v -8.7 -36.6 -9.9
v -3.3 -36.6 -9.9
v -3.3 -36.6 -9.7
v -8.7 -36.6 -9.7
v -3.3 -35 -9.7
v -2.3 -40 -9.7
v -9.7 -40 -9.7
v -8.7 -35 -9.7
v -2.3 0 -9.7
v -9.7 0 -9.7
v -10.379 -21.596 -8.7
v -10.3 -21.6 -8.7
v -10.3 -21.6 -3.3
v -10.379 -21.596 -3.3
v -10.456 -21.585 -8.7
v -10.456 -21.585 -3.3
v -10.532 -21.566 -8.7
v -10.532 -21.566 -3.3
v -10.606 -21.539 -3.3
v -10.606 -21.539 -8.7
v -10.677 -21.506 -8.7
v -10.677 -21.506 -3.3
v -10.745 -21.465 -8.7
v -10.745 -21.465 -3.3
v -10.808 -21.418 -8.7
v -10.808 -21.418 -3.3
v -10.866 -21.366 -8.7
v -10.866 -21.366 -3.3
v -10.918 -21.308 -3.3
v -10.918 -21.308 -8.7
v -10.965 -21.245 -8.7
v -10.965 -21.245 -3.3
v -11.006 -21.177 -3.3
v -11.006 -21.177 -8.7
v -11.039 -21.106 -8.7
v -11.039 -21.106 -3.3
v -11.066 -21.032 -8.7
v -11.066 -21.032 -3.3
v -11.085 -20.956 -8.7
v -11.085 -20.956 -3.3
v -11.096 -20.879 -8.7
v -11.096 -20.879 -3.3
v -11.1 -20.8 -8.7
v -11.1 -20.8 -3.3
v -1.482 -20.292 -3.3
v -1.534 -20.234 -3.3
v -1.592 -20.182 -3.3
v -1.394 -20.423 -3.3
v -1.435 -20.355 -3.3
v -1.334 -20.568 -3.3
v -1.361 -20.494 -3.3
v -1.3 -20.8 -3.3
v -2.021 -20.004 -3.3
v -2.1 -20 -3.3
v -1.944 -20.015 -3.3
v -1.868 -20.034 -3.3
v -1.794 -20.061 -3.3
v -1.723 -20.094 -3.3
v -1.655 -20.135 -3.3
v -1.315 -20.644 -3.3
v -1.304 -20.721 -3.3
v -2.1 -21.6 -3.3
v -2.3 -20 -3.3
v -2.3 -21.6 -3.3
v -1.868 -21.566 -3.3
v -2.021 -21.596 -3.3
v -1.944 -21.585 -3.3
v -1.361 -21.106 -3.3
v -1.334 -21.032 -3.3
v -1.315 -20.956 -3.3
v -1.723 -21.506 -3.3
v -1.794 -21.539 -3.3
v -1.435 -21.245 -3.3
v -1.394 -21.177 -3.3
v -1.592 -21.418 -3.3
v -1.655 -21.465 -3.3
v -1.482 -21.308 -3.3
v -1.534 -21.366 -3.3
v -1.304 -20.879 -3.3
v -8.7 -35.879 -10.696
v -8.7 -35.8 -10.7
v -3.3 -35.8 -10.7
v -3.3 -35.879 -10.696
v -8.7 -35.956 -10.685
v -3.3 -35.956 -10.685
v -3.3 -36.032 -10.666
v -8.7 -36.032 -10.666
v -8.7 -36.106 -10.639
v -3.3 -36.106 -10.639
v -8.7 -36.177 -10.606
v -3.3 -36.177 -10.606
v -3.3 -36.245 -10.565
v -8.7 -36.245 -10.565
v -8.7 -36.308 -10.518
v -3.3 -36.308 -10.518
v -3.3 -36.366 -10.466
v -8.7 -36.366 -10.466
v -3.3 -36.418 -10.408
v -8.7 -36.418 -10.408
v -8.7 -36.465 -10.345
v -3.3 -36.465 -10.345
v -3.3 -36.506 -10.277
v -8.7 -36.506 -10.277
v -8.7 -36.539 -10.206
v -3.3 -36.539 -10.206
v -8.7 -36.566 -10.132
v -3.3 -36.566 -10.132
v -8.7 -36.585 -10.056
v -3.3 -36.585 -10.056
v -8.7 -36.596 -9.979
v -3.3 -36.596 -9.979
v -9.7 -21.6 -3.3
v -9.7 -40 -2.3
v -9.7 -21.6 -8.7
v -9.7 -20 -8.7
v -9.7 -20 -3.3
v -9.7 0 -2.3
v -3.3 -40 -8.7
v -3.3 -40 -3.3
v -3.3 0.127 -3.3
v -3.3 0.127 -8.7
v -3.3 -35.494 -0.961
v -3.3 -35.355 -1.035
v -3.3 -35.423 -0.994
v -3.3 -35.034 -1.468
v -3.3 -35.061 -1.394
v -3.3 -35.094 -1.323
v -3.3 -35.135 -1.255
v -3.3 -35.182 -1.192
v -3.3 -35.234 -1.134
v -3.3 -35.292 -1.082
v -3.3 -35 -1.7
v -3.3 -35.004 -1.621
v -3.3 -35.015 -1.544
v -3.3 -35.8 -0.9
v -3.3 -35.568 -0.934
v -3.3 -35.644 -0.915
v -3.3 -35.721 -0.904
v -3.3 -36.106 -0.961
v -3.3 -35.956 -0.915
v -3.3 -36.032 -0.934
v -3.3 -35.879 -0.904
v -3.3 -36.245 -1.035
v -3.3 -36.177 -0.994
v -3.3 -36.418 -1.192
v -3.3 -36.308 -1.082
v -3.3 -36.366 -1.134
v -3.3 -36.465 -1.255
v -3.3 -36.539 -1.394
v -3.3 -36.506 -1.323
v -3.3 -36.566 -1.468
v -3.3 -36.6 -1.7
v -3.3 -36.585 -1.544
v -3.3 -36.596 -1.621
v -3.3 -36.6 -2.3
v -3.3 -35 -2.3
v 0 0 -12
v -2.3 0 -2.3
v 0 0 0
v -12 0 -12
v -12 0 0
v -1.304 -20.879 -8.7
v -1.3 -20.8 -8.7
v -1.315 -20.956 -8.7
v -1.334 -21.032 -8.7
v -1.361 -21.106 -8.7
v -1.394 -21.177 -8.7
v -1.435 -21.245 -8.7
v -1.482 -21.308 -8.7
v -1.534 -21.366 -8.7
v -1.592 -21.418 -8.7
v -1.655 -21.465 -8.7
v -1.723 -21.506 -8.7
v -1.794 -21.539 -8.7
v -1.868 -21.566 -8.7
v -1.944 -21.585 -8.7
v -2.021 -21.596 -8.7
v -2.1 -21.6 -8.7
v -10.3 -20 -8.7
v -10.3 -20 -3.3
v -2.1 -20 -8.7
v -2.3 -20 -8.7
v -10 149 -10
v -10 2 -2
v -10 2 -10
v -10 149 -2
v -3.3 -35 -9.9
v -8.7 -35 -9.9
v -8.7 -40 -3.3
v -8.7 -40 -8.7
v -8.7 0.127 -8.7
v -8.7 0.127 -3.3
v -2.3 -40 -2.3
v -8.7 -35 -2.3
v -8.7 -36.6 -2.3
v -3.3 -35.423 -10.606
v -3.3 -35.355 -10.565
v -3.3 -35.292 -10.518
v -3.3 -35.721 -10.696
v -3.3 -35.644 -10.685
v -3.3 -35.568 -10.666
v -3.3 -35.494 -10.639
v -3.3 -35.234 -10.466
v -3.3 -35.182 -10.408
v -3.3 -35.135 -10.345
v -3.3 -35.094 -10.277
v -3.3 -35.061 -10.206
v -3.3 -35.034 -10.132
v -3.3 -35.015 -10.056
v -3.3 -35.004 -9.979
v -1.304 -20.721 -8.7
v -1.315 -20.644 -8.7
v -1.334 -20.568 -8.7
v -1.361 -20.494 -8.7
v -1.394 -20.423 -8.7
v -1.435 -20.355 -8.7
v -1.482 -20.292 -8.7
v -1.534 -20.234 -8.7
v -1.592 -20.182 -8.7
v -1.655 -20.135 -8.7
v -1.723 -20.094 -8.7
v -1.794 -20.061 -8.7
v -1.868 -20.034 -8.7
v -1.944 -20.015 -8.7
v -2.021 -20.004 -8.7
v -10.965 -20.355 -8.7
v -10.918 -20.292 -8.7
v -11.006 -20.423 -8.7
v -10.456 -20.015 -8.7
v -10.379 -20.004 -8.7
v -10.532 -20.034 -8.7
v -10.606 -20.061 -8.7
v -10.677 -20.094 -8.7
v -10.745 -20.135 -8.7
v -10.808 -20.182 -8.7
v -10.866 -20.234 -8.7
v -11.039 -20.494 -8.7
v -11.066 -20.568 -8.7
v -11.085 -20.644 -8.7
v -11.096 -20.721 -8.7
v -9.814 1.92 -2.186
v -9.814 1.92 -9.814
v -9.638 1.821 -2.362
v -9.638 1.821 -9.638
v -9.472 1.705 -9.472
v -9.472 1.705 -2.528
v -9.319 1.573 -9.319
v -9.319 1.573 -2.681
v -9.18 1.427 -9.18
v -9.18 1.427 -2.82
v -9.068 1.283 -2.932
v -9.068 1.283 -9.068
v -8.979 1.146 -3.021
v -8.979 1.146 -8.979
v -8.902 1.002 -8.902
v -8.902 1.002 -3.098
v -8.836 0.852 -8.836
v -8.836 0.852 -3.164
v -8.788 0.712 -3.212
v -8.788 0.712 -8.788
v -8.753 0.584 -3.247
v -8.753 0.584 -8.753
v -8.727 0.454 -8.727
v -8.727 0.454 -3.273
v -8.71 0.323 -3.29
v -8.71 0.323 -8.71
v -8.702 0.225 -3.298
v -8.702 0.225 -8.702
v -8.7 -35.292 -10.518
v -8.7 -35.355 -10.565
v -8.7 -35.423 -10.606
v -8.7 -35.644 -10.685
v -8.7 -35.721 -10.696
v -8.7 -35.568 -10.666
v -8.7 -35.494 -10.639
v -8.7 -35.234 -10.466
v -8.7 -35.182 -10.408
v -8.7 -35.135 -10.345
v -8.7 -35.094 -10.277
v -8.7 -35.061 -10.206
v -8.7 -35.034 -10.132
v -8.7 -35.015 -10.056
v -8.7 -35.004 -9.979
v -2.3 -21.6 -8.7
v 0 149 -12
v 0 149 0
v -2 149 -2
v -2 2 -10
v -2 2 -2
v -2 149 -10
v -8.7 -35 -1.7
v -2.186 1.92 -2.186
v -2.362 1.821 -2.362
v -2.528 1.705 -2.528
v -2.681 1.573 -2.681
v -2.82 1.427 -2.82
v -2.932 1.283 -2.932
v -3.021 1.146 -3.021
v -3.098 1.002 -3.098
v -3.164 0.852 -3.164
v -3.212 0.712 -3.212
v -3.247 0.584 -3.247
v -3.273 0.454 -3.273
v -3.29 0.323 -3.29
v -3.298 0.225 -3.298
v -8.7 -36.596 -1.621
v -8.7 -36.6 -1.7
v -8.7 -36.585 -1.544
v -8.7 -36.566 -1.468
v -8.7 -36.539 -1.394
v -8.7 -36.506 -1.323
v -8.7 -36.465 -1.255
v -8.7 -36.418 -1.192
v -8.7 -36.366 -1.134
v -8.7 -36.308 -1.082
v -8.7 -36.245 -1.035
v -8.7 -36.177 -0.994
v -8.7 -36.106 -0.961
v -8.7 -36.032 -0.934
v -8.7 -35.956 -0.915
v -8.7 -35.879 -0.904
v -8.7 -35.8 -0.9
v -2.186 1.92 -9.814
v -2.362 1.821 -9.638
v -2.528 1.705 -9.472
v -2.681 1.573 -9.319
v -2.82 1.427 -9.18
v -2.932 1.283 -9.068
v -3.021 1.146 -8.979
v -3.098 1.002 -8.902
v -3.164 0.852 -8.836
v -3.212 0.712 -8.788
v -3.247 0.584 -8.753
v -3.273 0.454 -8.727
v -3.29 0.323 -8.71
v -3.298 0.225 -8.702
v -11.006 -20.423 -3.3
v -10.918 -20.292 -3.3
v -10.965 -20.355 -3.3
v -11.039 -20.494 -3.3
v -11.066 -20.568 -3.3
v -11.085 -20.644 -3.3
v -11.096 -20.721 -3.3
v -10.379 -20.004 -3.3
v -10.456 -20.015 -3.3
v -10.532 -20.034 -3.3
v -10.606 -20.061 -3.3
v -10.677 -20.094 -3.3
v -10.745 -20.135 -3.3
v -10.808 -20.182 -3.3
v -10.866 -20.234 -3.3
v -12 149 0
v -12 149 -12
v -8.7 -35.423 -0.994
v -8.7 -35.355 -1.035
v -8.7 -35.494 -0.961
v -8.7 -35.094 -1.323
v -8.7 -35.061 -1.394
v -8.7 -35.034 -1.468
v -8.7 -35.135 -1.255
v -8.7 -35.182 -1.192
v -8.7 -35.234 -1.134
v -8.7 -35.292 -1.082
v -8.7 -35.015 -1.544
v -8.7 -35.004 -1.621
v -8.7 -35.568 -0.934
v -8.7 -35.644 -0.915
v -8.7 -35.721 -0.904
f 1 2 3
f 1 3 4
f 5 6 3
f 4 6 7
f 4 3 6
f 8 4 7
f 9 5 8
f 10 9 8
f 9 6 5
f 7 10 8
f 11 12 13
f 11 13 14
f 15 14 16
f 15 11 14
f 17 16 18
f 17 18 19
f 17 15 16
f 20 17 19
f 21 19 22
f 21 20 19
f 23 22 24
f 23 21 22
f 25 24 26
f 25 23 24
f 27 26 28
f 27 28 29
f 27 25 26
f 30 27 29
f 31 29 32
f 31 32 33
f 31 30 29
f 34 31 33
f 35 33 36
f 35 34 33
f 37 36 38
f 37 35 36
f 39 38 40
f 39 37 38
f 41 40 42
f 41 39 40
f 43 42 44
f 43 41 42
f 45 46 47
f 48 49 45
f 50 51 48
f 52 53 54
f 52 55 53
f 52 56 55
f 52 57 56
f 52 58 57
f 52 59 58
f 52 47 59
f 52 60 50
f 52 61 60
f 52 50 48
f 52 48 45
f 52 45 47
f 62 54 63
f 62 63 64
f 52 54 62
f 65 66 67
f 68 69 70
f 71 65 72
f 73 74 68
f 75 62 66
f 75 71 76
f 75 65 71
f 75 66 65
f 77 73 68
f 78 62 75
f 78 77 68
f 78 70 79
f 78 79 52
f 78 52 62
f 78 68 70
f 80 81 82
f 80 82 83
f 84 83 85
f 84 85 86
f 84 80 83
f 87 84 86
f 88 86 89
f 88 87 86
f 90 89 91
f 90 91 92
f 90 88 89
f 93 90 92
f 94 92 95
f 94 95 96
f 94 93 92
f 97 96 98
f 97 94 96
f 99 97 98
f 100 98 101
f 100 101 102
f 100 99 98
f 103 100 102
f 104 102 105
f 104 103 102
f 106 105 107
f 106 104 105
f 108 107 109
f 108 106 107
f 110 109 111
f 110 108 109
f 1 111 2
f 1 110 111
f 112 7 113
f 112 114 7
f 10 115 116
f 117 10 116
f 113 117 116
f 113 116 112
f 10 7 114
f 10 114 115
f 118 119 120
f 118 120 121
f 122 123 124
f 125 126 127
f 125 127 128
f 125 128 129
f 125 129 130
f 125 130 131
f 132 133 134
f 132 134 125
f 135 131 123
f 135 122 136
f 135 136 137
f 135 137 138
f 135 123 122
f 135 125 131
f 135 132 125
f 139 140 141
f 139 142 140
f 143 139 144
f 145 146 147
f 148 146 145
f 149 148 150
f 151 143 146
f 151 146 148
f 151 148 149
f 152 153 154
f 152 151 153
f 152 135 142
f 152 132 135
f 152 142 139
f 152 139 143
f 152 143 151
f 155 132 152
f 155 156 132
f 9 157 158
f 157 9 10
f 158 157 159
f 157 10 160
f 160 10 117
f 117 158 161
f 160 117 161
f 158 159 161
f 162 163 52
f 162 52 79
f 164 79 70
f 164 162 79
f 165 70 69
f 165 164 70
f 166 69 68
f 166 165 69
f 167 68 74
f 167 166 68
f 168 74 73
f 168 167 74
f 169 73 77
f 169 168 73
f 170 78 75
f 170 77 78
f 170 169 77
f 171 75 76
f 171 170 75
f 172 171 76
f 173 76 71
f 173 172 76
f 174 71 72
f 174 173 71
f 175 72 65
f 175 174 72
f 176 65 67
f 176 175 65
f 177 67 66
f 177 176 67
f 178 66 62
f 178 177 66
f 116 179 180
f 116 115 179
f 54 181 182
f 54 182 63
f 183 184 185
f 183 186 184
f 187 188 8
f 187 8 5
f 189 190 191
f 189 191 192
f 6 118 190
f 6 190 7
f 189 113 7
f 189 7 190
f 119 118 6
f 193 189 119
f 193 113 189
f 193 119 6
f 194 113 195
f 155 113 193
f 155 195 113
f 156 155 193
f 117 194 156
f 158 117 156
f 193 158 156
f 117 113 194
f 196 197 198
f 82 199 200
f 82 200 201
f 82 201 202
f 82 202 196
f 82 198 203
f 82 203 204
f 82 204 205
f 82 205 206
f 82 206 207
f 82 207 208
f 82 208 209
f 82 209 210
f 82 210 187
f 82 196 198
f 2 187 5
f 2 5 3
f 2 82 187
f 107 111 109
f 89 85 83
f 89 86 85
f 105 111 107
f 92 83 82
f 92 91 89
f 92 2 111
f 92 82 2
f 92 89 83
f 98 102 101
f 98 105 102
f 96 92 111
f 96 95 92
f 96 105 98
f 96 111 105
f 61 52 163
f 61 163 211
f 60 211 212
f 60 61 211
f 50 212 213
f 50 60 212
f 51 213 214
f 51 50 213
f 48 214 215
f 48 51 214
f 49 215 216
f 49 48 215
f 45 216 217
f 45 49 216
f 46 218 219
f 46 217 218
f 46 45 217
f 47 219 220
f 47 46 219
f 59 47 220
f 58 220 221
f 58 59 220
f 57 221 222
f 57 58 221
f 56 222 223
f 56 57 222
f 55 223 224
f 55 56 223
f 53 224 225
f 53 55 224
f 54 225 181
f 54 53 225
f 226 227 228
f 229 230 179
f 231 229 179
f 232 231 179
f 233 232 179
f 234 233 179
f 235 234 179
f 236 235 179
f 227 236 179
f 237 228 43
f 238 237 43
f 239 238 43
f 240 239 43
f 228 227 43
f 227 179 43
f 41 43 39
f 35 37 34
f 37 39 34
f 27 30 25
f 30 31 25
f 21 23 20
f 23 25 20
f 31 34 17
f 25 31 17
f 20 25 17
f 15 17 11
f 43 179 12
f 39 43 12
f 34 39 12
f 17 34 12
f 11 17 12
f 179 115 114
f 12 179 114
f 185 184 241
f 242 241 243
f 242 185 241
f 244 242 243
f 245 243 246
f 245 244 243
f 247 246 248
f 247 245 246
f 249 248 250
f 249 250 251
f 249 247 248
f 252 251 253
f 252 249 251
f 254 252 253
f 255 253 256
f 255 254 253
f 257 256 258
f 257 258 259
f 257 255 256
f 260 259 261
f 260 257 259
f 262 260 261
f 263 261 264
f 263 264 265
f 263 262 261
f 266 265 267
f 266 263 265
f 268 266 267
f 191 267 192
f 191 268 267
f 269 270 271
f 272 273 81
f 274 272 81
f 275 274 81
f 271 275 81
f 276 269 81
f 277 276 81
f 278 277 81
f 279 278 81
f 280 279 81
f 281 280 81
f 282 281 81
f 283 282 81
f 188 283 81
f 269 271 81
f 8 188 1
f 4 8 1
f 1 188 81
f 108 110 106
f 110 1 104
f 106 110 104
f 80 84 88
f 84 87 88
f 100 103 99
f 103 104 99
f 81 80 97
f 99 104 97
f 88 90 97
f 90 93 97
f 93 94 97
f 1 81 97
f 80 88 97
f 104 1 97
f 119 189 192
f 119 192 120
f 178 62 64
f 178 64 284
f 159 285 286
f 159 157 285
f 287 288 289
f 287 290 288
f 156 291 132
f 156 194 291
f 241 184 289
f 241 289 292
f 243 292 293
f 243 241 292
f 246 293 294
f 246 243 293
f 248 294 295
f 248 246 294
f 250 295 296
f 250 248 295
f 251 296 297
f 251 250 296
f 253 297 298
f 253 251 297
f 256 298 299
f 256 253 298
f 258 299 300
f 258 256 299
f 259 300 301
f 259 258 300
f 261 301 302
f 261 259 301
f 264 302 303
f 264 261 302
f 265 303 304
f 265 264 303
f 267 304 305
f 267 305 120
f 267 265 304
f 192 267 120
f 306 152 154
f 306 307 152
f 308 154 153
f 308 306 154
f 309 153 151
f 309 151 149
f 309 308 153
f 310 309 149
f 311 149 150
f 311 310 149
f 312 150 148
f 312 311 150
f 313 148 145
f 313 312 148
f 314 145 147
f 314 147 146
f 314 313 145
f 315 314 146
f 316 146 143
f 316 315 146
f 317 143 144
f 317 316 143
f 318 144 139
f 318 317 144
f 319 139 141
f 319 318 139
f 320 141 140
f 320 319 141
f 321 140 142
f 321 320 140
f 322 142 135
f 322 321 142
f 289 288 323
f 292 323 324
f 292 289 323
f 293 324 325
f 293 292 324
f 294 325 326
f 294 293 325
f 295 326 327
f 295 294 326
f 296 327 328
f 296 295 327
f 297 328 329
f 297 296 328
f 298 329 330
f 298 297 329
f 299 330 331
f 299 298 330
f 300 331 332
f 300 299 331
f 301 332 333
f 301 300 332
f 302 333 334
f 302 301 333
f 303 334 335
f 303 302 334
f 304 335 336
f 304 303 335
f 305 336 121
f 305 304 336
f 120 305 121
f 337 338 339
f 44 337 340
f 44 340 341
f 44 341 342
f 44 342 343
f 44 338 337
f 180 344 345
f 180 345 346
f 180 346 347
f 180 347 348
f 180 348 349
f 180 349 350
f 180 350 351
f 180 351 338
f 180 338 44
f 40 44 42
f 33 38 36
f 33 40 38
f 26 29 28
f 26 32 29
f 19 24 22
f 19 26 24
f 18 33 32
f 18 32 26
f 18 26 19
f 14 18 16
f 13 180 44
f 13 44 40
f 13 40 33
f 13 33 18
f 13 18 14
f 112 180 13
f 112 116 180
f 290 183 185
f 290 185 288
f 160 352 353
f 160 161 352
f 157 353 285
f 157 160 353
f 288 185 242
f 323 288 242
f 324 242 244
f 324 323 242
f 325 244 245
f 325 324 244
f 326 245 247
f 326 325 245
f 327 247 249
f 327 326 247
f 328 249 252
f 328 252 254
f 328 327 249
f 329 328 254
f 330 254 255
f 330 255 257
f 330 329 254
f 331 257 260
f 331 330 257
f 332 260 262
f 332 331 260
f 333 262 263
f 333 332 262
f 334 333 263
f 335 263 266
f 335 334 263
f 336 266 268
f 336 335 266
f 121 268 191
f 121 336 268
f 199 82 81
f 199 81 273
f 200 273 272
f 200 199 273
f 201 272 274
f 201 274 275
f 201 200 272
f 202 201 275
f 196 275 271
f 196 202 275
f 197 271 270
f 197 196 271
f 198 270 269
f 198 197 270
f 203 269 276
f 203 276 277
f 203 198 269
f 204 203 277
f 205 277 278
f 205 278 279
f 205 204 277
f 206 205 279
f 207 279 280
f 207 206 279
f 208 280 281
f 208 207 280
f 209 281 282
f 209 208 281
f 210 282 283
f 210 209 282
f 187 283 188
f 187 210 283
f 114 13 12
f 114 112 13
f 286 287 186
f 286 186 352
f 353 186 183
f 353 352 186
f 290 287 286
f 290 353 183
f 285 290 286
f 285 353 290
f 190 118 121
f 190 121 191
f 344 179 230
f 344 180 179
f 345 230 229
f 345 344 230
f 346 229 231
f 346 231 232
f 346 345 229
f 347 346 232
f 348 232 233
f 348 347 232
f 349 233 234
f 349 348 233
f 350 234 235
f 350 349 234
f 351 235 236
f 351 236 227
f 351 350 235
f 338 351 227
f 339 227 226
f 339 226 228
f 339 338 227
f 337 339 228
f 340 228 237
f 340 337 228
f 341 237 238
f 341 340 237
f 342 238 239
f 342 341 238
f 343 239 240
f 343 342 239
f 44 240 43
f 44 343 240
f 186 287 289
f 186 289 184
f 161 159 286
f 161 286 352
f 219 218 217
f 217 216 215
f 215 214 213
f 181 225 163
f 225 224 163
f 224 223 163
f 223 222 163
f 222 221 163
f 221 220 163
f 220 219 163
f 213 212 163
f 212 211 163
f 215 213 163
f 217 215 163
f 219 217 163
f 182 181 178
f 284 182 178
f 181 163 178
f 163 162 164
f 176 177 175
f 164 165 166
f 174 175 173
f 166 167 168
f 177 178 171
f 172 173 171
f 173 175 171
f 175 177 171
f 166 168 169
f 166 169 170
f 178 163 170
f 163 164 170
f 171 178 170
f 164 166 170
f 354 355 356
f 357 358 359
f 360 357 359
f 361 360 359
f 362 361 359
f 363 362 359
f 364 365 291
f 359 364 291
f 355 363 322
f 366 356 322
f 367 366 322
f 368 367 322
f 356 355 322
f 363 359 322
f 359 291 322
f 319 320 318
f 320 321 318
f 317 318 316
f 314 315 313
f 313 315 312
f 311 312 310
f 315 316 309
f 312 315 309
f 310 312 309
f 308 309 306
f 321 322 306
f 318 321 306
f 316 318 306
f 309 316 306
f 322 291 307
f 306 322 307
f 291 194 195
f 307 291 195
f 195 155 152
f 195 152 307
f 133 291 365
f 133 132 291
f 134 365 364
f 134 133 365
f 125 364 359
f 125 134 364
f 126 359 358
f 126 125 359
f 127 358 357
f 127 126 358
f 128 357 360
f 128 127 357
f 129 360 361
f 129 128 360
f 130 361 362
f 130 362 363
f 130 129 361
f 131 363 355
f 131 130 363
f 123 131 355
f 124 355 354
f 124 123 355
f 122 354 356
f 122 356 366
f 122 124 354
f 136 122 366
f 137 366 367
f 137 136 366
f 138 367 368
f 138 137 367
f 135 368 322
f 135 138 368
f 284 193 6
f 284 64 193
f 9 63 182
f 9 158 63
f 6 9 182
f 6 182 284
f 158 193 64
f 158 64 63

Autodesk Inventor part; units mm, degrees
ref_plane "YZ Plane" through (0, 0, 0) normal (1, 0, 0) x (0, 1, 0)
ref_plane "XZ Plane" through (0, 0, 0) normal (0, 1, 0) x (-1, 0, 0)
ref_plane "XY Plane" through (0, 0, 0) normal (0, 0, 1) x (1, 0, 0)
sketch "Szkic1" plane through (0, 0, 0) normal (0, 1, 0) x (-1, 0, 0)
  line L0 (0, 0) -> (12, 0)
  line L1 (12, 0) -> (12, -12)
  line L2 (12, -12) -> (0, -12)
  line L3 (0, -12) -> (0, 0)
  dimension "d0" = 12
  dimension "d1" = 12
extrude "Wyciągnięcie proste1" add sketch "Szkic1" along normal blind 86
sketch "Szkic2" plane through (0, 86, 0) normal (0, 1, 0) x (1, 0, 0)
  line L0 (0, 12) -> (-12, 12) projected
  line L1 (-12, 12) -> (-12, 0) projected
  line L2 (-12, 0) -> (0, 0) projected
  line L3 (0, 0) -> (0, 12) projected
  line L4 (-10, 2) -> (-10, 10)
  line L5 (-10, 10) -> (-2, 10)
  line L6 (-2, 10) -> (-2, 2)
  line L7 (-2, 2) -> (-10, 2)
  dimension "d4" = 2
extrude "Wyciągnięcie proste2" cut sketch "Szkic2" against normal blind 86 contours L4 L5 L6 L7
sketch "Szkic9" plane through (0, 0, 0) normal (0, -1, 0) x (1, 0, 0)
  line L0 (-2, -10) -> (-10, -10) projected
  line L1 (-2, -2) -> (-2, -10) projected
  line L2 (-10, -2) -> (-2, -2) projected
  line L3 (-10, -10) -> (-10, -2) projected
  line L4 (-2.3, -2.3) -> (-2.3, -9.7)
  line L5 (-2.3, -9.7) -> (-9.7, -9.7)
  line L6 (-9.7, -9.7) -> (-9.7, -2.3)
  line L7 (-9.7, -2.3) -> (-2.3, -2.3)
  line L8 (-3.3, -3.3) -> (-3.3, -8.7)
  line L9 (-3.3, -8.7) -> (-8.7, -8.7)
  line L10 (-8.7, -8.7) -> (-8.7, -3.3)
  line L11 (-8.7, -3.3) -> (-3.3, -3.3)
  point P0 (0, 0)
  dimension "d21" = 0.3
  dimension "d22" = 1
extrude "Wyciągnięcie proste8" add sketch "Szkic9" along normal blind 40 contours L4 L5 L6 L7
sketch "Szkic10" plane through (0, 0, 0) normal (0, 1, 0) x (1, 0, 0)
  line L0 (-2, 2) -> (-2, 10) projected
  line L1 (-10.1182, 1.9087) -> (-2, 1.9087)
  line L2 (-2, 1.9087) -> (-2, 10)
  line L3 (-2, 10) -> (-10.1182, 10)
  line L4 (-10.1182, 10) -> (-10.1182, 1.9087)
  line L5 (-3.3, 3.3) -> (-3.3, 8.7) projected
  line L6 (-8.7, 3.3) -> (-3.3, 3.3) projected
  line L7 (-8.7, 8.7) -> (-8.7, 3.3) projected
  line L8 (-3.3, 8.7) -> (-8.7, 8.7) projected
  line L9 (-8.7, 3.3) -> (-3.3, 3.3)
  line L10 (-3.3, 3.3) -> (-3.3, 8.7)
  line L11 (-3.3, 8.7) -> (-8.7, 8.7)
  line L12 (-8.7, 8.7) -> (-8.7, 3.3)
  point P0 (0, 0)
extrude "Wyciągnięcie proste9" add sketch "Szkic10" along normal blind 2
sketch "Szkic11" plane through (-9.7, 0, -9.7) normal (-1, 0, 0) x (0, 0, 1)
  line L0 (7.4, 0) -> (0, 0) projected
  line L1 (2.1159, 0) -> (2.1159, -20)
  line L2 (1, 2) -> (1, -40) projected
  line L3 (6.4, 2) -> (6.4, -40) projected
  line L4 (1, -20) -> (6.4, -20)
  line L5 (6.4, -20) -> (6.4, -21.6)
  line L6 (6.4, -21.6) -> (1, -21.6)
  line L7 (1, -21.6) -> (1, -20)
  point P0 (9.7, 0)
  point P1 (1, -21.6)
  dimension "d27" = 20
  dimension "d28" = 1.6
extrude "Wyciągnięcie proste10" add sketch "Szkic11" along normal blind 1.4 contours L3 L6 L2 L4
pattern_linear "Szyk prostokątny1" count 2 spacing 8.4 along (1, 0, 0) of "Wyciągnięcie proste10"
sketch "Szkic12" plane through (-9.7, 0, -2.3) normal (0, 0, 1) x (1, 0, 0)
  line L0 (9.7, 0) -> (-2.3, 0) projected
  line L1 (2.9125, 0) -> (2.9125, -35)
  line L2 (1, 2) -> (1, -40) projected
  line L3 (1, 2) -> (1, -40) projected
  line L4 (6.4, 2) -> (6.4, -40) projected
  line L5 (1, -35) -> (6.4, -35)
  line L6 (6.4, -35) -> (6.4, -36.6)
  line L7 (6.4, -36.6) -> (1, -36.6)
  line L8 (1, -36.6) -> (1, -35)
  dimension "d34" = 35
  dimension "d35" = 1.6
extrude "Wyciągnięcie proste11" add sketch "Szkic12" along normal blind 1.4 contours L4 L7 L2 L5
pattern_linear "Szyk prostokątny2" count 2 spacing 8.4 along (0, 0, -1) of "Wyciągnięcie proste11"
fillet "Zaokrąglenie1" radius 2 4 edges at (-8.7, 2, -6) (-6, 2, -3.3) (-6, 2, -8.7) (-3.3, 2, -6)
sketch "Szkic13" plane through (0, 86, 0) normal (0, 1, 0) x (1, 0, 0)
  line L0 (0, 0) -> (0, 12) projected
  line L1 (-12, 12) -> (-12, 0) projected
  line L2 (0, 0) -> (-12, 0)
  line L3 (-12, 0) -> (-12, 12)
  line L4 (-12, 12) -> (0, 12)
  line L5 (0, 12) -> (0, 0)
  line L6 (-2, 10) -> (-2, 2) projected
  line L7 (-10, 2) -> (-10, 10) projected
  line L8 (-2, 2) -> (-10, 2)
  line L9 (-10, 2) -> (-10, 10)
  line L10 (-10, 10) -> (-2, 10)
  line L11 (-2, 10) -> (-2, 2)
extrude "Wyciągnięcie proste12" add sketch "Szkic13" along normal blind 63
fillet "Zaokrąglenie2" radius 0.8 8 edges at (-11.1, -20, -6) (-11.1, -21.6, -6) (-1.3, -20, -6) (-1.3, -21.6, -6) (-6, -36.6, -0.9) (-6, -35, -0.9) (-6, -35, -10.7) (-6, -36.6, -10.7)
